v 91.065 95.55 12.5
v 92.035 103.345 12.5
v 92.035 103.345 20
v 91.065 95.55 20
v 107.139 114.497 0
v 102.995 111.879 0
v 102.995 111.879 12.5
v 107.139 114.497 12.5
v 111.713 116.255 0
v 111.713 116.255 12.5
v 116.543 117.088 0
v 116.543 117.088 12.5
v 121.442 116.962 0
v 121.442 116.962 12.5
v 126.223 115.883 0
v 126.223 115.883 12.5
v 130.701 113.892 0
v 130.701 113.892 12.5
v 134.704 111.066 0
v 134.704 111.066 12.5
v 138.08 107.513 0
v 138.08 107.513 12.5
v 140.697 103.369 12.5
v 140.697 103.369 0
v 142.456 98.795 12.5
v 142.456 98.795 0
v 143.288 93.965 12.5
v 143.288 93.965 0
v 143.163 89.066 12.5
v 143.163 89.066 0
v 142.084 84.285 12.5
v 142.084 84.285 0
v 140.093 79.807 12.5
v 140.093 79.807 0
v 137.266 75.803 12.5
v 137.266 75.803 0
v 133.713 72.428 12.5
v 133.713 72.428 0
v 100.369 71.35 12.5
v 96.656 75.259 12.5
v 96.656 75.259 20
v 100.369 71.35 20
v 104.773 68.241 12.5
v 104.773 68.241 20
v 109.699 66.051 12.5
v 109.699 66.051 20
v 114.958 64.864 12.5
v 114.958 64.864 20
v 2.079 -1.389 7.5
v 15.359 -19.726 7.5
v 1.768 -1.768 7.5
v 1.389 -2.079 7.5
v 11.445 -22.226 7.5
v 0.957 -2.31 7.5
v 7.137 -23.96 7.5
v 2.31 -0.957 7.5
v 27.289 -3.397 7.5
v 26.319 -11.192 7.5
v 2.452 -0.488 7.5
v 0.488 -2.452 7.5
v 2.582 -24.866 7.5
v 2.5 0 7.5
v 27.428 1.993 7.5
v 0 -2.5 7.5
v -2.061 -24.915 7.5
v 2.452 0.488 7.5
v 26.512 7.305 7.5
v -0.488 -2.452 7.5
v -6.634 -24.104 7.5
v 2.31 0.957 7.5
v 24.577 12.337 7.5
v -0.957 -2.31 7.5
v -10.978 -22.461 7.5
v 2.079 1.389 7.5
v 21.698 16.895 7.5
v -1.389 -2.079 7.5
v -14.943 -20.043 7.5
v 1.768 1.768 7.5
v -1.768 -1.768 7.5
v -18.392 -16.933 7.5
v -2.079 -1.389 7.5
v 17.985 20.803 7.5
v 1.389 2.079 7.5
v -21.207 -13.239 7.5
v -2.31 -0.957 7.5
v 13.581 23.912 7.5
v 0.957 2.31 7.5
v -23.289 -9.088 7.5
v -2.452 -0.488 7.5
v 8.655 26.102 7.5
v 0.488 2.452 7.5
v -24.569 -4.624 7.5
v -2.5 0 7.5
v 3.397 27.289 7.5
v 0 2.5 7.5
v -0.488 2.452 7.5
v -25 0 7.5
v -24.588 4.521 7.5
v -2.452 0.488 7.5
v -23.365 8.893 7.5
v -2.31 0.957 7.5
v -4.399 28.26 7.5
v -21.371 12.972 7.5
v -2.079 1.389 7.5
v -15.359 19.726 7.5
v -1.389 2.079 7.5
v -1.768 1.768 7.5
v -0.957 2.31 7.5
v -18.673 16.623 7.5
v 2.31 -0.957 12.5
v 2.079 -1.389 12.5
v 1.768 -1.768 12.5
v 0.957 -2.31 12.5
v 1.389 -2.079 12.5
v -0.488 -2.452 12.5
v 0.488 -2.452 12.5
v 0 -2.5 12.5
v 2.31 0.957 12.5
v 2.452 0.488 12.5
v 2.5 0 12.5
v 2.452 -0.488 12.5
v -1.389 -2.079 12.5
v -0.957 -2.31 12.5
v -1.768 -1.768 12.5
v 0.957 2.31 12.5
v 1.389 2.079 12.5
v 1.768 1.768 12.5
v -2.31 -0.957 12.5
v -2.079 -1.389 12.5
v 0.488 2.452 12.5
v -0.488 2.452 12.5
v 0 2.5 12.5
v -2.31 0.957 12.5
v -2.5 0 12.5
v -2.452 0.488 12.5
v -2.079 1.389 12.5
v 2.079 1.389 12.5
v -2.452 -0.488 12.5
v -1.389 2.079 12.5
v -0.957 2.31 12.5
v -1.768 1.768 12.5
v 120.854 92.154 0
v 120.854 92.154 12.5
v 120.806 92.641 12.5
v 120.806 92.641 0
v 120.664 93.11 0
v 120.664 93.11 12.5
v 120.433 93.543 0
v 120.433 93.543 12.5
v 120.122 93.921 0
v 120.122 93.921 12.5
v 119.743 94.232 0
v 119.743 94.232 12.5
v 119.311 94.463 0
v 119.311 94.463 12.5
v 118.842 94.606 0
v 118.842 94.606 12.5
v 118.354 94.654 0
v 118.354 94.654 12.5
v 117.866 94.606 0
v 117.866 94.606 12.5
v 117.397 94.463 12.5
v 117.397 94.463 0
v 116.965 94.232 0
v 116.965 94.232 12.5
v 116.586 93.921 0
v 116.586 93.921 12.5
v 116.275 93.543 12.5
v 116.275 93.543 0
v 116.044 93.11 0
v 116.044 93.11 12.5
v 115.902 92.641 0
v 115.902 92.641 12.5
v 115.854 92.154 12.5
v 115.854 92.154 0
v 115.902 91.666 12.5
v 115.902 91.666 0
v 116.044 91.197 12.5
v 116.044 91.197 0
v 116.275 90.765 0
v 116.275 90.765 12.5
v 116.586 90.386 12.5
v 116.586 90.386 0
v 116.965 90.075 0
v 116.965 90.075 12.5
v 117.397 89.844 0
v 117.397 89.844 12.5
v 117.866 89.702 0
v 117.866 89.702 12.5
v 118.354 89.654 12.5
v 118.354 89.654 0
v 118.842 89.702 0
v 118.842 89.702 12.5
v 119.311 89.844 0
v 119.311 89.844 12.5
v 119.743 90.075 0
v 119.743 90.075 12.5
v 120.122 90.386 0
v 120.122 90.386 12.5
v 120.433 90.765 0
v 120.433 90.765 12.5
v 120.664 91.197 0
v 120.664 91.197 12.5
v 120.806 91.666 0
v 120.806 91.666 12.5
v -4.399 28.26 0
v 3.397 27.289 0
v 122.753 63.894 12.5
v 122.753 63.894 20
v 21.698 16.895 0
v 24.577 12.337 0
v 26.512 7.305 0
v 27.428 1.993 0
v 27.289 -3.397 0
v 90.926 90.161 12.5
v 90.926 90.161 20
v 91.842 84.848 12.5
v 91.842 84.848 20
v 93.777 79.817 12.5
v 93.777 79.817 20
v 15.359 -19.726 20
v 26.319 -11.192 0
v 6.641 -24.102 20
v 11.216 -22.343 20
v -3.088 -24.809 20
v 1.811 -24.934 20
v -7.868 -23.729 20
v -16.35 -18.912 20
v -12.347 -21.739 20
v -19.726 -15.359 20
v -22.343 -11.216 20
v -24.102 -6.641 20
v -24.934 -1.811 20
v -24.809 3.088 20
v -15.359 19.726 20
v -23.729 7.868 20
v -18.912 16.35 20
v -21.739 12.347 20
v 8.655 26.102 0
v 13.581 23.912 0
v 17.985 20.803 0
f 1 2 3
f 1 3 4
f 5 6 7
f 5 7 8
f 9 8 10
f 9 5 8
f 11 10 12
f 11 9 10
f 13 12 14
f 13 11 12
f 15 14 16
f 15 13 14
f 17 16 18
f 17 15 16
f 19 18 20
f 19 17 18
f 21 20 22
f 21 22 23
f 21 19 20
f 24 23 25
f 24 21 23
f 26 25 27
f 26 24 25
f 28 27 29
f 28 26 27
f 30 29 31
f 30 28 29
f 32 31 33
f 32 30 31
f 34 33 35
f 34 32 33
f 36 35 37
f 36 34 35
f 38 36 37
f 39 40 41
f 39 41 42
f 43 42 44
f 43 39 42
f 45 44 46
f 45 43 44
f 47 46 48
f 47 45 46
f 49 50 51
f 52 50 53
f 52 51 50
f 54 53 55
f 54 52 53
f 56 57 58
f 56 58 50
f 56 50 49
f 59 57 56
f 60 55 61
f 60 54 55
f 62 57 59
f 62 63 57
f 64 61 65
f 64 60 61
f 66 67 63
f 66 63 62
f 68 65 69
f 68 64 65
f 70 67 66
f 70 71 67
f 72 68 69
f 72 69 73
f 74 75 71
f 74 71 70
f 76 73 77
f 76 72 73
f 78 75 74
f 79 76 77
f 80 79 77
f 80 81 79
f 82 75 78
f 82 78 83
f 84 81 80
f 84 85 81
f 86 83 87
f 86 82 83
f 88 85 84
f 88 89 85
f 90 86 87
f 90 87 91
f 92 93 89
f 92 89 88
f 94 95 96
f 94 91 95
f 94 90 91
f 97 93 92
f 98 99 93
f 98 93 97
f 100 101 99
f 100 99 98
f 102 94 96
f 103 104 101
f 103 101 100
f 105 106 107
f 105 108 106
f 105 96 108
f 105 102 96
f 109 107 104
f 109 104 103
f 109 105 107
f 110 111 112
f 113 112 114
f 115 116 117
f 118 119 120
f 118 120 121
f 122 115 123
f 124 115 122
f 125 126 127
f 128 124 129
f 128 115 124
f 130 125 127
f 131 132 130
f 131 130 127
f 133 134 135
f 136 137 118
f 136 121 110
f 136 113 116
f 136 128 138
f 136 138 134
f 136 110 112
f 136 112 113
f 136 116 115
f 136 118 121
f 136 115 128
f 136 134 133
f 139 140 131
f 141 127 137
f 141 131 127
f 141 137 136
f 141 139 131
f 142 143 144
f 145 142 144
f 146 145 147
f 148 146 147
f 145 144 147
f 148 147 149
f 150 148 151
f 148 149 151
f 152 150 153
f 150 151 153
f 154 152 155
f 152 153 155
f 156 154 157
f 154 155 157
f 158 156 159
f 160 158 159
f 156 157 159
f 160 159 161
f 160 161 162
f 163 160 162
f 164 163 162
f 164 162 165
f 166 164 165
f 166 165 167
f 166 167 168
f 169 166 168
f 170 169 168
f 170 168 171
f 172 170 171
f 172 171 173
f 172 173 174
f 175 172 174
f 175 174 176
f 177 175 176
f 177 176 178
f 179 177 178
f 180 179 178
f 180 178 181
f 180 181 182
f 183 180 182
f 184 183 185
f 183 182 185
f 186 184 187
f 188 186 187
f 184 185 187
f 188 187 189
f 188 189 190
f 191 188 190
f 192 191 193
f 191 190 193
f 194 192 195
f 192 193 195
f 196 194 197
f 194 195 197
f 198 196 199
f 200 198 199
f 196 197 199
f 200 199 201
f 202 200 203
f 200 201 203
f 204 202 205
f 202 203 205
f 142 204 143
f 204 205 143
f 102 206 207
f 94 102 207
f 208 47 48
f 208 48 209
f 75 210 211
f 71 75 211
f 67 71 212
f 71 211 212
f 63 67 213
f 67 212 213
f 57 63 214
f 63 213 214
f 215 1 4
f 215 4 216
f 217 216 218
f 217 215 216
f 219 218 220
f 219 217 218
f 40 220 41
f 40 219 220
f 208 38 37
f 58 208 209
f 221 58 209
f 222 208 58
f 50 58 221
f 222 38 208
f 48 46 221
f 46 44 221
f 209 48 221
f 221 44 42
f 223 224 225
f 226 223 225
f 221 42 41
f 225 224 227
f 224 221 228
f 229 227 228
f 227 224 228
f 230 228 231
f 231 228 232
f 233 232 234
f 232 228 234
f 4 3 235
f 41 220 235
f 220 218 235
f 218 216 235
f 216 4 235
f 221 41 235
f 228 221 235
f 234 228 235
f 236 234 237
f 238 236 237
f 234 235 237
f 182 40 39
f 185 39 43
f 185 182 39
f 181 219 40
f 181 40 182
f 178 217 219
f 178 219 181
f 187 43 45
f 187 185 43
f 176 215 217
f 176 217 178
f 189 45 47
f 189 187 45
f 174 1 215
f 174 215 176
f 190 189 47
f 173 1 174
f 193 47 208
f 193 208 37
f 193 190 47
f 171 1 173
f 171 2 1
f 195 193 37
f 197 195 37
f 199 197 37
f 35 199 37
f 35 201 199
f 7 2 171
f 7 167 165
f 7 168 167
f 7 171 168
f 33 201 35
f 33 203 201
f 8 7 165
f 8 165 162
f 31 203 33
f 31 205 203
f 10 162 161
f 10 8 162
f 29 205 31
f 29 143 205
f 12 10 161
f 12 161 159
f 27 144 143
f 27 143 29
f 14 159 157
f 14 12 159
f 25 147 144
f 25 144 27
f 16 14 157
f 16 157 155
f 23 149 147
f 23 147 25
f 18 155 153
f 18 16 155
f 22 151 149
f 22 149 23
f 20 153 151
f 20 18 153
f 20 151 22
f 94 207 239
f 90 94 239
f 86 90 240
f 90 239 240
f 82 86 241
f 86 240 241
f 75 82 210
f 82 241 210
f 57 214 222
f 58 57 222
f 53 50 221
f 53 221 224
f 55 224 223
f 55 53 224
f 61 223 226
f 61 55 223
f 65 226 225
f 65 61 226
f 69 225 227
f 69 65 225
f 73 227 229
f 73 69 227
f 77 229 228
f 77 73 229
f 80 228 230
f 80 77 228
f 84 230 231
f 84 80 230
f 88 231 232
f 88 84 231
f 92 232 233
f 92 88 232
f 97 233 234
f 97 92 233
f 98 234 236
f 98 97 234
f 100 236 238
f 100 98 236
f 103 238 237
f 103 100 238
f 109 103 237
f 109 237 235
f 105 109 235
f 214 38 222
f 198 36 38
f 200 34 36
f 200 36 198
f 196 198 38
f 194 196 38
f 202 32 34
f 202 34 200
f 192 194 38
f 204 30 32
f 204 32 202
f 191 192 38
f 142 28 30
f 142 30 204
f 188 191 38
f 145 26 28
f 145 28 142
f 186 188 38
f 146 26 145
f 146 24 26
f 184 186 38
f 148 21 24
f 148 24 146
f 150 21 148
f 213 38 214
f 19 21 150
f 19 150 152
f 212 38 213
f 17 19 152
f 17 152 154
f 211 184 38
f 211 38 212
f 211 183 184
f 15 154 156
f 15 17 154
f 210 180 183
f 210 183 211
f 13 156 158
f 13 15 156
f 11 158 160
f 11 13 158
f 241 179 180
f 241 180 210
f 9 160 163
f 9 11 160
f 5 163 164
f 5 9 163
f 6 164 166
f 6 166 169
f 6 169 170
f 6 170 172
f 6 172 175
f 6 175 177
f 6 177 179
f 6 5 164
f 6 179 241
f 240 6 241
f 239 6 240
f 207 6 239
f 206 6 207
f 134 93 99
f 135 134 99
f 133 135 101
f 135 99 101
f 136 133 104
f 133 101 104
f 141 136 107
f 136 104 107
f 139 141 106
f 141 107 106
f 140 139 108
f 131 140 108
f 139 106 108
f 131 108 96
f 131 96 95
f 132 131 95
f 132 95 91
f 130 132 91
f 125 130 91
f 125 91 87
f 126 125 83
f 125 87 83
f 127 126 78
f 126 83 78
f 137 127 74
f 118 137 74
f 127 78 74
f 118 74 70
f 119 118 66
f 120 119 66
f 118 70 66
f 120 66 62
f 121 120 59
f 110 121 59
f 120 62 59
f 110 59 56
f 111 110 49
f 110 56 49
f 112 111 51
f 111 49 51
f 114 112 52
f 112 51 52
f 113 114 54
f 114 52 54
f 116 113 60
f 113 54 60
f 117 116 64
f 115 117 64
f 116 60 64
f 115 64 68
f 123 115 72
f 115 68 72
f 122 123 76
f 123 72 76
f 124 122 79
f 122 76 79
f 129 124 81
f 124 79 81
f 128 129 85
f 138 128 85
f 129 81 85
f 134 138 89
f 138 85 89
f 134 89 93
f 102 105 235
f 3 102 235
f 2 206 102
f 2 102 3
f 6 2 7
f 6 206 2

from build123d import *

# Parameters (mm, degrees)
BOSS_EXTRUDE1_DEPTH     = 20
CUT_EXTRUDE1_DEPTH      = 7.5
SKETCH3_R               = 2.5
CUT_EXTRUDE2_DEPTH      = 5
CUT_EXTRUDE3_START      = -7.5
SKETCH4_R               = 25
CUT_EXTRUDE3_DEPTH      = 7.5
CUT_EXTRUDE4_DEPTH      = 7.5
CUT_EXTRUDE5_DEPTH      = 187.21329098
CUT_EXTRUDE5_DEPTH_BACK = 7.5
SKETCH7_R               = 2.5
CUT_EXTRUDE6_DEPTH      = 186.557645323


with BuildPart() as part:
    # Sketch1 → Boss-Extrude1 (new body)
    with BuildSketch(Plane.XY):
        with BuildLine():
            Line((-15.358937815, 19.725694644), (102.995230052, 111.879321533))
            ThreePointArc((102.995230052, 111.879321533), (138.079862511, 107.512564703), (133.713105681, 72.427932244))
            Line((133.713105681, 72.427932244), (15.358937815, -19.725694644))
            ThreePointArc((15.358937815, -19.725694644), (-19.725694644, -15.358937815), (-15.358937815, 19.725694644))
        make_face()
    extrude(amount=BOSS_EXTRUDE1_DEPTH)

    # Sketch2 → Cut-Extrude1 (cut)
    with BuildSketch(Plane(origin=(0, 0, 0), x_dir=(-1, 0, 0), z_dir=(0, 0, -1))):
        with BuildLine():
            ThreePointArc((15.358937815, 19.725694644), (-19.725694644, 15.358937815), (-15.358937815, -19.725694644))
            ThreePointArc((-15.358937815, -19.725694644), (10.977853949, -22.460781881), (25, 0))
            ThreePointArc((25, 0), (22.460781881, 10.977853949), (15.358937815, 19.725694644))
        make_face()
    extrude(amount=-CUT_EXTRUDE1_DEPTH, mode=Mode.SUBTRACT)

    # Sketch3 → Cut-Extrude2 (cut)
    with BuildSketch(Plane(origin=(0, 0, 7.5), x_dir=(-1, 0, 0), z_dir=(0, 0, -1))):
        Circle(SKETCH3_R)
    extrude(amount=-CUT_EXTRUDE2_DEPTH, mode=Mode.SUBTRACT)

    # Sketch4 → Cut-Extrude3 (cut)
    with BuildSketch(Plane.XY.offset(20).offset(CUT_EXTRUDE3_START)):
        with Locations((118.354167866, 92.153626888)):
            Circle(SKETCH4_R)
    extrude(amount=CUT_EXTRUDE3_DEPTH, mode=Mode.SUBTRACT)

    # Sketch5 → Cut-Extrude4 (cut)
    with BuildSketch(Plane(origin=(0, 0, 0), x_dir=(-1, 0, 0), z_dir=(0, 0, -1))):
        with BuildLine():
            ThreePointArc((-3.396539703, 27.28943968), (-13.581209957, 23.912355302), (-21.698264109, 16.894831596))
            Line((-21.698264109, 16.894831596), (-19.725694644, 15.358937815))
            ThreePointArc((-19.725694644, 15.358937815), (-3.087763366, 24.808581527), (15.358937815, 19.725694644))
            Line((15.358937815, 19.725694644), (4.398653076, 28.259656807))
            Line((4.398653076, 28.259656807), (-3.396539703, 27.28943968))
        make_face()
        with BuildLine():
            Line((-27.28943968, -3.396539703), (-26.319222553, -11.191732482))
            Line((-26.319222553, -11.191732482), (-15.358937815, -19.725694644))
            ThreePointArc((-15.358937815, -19.725694644), (-24.808581527, -3.087763366), (-19.725694644, 15.358937815))
            Line((-19.725694644, 15.358937815), (-21.698264109, 16.894831596))
            ThreePointArc((-21.698264109, 16.894831596), (-26.511954246, 7.305222931), (-27.28943968, -3.396539703))
        make_face()
    extrude(amount=-CUT_EXTRUDE4_DEPTH, mode=Mode.SUBTRACT)

    # Sketch6 → Cut-Extrude5 (cut, two sides: drawn at the far end of the back side and taken through both)
    with BuildSketch(Plane.XY.offset(20).offset(-CUT_EXTRUDE5_DEPTH_BACK)):
        with BuildLine():
            Line((98.628473222, 76.794689074), (96.655903758, 75.258795292))
            ThreePointArc((96.655903758, 75.258795292), (104.77295791, 68.241271586), (114.957628164, 64.864187208))
            Line((114.957628164, 64.864187208), (122.752820943, 63.893970081))
            Line((122.752820943, 63.893970081), (133.713105681, 72.427932244))
            ThreePointArc((133.713105681, 72.427932244), (115.2664045, 67.345045361), (98.628473222, 76.794689074))
        make_face()
        with BuildLine():
            ThreePointArc((91.064728186, 95.550166591), (91.842213621, 84.848403957), (96.655903758, 75.258795292))
            Line((96.655903758, 75.258795292), (98.628473222, 76.794689074))
            ThreePointArc((98.628473222, 76.794689074), (93.545586339, 95.241390254), (102.995230052, 111.879321533))
            Line((102.995230052, 111.879321533), (92.034945313, 103.34535937))
            Line((92.034945313, 103.34535937), (91.064728186, 95.550166591))
        make_face()
    extrude(amount=CUT_EXTRUDE5_DEPTH + CUT_EXTRUDE5_DEPTH_BACK, mode=Mode.SUBTRACT)

    # Sketch7 → Cut-Extrude6 (cut, through all)
    with BuildSketch(Plane.XY.offset(12.5)):
        with Locations((118.354167866, 92.153626888)):
            Circle(SKETCH7_R)
    extrude(amount=-CUT_EXTRUDE6_DEPTH, mode=Mode.SUBTRACT)


solid = part.part
